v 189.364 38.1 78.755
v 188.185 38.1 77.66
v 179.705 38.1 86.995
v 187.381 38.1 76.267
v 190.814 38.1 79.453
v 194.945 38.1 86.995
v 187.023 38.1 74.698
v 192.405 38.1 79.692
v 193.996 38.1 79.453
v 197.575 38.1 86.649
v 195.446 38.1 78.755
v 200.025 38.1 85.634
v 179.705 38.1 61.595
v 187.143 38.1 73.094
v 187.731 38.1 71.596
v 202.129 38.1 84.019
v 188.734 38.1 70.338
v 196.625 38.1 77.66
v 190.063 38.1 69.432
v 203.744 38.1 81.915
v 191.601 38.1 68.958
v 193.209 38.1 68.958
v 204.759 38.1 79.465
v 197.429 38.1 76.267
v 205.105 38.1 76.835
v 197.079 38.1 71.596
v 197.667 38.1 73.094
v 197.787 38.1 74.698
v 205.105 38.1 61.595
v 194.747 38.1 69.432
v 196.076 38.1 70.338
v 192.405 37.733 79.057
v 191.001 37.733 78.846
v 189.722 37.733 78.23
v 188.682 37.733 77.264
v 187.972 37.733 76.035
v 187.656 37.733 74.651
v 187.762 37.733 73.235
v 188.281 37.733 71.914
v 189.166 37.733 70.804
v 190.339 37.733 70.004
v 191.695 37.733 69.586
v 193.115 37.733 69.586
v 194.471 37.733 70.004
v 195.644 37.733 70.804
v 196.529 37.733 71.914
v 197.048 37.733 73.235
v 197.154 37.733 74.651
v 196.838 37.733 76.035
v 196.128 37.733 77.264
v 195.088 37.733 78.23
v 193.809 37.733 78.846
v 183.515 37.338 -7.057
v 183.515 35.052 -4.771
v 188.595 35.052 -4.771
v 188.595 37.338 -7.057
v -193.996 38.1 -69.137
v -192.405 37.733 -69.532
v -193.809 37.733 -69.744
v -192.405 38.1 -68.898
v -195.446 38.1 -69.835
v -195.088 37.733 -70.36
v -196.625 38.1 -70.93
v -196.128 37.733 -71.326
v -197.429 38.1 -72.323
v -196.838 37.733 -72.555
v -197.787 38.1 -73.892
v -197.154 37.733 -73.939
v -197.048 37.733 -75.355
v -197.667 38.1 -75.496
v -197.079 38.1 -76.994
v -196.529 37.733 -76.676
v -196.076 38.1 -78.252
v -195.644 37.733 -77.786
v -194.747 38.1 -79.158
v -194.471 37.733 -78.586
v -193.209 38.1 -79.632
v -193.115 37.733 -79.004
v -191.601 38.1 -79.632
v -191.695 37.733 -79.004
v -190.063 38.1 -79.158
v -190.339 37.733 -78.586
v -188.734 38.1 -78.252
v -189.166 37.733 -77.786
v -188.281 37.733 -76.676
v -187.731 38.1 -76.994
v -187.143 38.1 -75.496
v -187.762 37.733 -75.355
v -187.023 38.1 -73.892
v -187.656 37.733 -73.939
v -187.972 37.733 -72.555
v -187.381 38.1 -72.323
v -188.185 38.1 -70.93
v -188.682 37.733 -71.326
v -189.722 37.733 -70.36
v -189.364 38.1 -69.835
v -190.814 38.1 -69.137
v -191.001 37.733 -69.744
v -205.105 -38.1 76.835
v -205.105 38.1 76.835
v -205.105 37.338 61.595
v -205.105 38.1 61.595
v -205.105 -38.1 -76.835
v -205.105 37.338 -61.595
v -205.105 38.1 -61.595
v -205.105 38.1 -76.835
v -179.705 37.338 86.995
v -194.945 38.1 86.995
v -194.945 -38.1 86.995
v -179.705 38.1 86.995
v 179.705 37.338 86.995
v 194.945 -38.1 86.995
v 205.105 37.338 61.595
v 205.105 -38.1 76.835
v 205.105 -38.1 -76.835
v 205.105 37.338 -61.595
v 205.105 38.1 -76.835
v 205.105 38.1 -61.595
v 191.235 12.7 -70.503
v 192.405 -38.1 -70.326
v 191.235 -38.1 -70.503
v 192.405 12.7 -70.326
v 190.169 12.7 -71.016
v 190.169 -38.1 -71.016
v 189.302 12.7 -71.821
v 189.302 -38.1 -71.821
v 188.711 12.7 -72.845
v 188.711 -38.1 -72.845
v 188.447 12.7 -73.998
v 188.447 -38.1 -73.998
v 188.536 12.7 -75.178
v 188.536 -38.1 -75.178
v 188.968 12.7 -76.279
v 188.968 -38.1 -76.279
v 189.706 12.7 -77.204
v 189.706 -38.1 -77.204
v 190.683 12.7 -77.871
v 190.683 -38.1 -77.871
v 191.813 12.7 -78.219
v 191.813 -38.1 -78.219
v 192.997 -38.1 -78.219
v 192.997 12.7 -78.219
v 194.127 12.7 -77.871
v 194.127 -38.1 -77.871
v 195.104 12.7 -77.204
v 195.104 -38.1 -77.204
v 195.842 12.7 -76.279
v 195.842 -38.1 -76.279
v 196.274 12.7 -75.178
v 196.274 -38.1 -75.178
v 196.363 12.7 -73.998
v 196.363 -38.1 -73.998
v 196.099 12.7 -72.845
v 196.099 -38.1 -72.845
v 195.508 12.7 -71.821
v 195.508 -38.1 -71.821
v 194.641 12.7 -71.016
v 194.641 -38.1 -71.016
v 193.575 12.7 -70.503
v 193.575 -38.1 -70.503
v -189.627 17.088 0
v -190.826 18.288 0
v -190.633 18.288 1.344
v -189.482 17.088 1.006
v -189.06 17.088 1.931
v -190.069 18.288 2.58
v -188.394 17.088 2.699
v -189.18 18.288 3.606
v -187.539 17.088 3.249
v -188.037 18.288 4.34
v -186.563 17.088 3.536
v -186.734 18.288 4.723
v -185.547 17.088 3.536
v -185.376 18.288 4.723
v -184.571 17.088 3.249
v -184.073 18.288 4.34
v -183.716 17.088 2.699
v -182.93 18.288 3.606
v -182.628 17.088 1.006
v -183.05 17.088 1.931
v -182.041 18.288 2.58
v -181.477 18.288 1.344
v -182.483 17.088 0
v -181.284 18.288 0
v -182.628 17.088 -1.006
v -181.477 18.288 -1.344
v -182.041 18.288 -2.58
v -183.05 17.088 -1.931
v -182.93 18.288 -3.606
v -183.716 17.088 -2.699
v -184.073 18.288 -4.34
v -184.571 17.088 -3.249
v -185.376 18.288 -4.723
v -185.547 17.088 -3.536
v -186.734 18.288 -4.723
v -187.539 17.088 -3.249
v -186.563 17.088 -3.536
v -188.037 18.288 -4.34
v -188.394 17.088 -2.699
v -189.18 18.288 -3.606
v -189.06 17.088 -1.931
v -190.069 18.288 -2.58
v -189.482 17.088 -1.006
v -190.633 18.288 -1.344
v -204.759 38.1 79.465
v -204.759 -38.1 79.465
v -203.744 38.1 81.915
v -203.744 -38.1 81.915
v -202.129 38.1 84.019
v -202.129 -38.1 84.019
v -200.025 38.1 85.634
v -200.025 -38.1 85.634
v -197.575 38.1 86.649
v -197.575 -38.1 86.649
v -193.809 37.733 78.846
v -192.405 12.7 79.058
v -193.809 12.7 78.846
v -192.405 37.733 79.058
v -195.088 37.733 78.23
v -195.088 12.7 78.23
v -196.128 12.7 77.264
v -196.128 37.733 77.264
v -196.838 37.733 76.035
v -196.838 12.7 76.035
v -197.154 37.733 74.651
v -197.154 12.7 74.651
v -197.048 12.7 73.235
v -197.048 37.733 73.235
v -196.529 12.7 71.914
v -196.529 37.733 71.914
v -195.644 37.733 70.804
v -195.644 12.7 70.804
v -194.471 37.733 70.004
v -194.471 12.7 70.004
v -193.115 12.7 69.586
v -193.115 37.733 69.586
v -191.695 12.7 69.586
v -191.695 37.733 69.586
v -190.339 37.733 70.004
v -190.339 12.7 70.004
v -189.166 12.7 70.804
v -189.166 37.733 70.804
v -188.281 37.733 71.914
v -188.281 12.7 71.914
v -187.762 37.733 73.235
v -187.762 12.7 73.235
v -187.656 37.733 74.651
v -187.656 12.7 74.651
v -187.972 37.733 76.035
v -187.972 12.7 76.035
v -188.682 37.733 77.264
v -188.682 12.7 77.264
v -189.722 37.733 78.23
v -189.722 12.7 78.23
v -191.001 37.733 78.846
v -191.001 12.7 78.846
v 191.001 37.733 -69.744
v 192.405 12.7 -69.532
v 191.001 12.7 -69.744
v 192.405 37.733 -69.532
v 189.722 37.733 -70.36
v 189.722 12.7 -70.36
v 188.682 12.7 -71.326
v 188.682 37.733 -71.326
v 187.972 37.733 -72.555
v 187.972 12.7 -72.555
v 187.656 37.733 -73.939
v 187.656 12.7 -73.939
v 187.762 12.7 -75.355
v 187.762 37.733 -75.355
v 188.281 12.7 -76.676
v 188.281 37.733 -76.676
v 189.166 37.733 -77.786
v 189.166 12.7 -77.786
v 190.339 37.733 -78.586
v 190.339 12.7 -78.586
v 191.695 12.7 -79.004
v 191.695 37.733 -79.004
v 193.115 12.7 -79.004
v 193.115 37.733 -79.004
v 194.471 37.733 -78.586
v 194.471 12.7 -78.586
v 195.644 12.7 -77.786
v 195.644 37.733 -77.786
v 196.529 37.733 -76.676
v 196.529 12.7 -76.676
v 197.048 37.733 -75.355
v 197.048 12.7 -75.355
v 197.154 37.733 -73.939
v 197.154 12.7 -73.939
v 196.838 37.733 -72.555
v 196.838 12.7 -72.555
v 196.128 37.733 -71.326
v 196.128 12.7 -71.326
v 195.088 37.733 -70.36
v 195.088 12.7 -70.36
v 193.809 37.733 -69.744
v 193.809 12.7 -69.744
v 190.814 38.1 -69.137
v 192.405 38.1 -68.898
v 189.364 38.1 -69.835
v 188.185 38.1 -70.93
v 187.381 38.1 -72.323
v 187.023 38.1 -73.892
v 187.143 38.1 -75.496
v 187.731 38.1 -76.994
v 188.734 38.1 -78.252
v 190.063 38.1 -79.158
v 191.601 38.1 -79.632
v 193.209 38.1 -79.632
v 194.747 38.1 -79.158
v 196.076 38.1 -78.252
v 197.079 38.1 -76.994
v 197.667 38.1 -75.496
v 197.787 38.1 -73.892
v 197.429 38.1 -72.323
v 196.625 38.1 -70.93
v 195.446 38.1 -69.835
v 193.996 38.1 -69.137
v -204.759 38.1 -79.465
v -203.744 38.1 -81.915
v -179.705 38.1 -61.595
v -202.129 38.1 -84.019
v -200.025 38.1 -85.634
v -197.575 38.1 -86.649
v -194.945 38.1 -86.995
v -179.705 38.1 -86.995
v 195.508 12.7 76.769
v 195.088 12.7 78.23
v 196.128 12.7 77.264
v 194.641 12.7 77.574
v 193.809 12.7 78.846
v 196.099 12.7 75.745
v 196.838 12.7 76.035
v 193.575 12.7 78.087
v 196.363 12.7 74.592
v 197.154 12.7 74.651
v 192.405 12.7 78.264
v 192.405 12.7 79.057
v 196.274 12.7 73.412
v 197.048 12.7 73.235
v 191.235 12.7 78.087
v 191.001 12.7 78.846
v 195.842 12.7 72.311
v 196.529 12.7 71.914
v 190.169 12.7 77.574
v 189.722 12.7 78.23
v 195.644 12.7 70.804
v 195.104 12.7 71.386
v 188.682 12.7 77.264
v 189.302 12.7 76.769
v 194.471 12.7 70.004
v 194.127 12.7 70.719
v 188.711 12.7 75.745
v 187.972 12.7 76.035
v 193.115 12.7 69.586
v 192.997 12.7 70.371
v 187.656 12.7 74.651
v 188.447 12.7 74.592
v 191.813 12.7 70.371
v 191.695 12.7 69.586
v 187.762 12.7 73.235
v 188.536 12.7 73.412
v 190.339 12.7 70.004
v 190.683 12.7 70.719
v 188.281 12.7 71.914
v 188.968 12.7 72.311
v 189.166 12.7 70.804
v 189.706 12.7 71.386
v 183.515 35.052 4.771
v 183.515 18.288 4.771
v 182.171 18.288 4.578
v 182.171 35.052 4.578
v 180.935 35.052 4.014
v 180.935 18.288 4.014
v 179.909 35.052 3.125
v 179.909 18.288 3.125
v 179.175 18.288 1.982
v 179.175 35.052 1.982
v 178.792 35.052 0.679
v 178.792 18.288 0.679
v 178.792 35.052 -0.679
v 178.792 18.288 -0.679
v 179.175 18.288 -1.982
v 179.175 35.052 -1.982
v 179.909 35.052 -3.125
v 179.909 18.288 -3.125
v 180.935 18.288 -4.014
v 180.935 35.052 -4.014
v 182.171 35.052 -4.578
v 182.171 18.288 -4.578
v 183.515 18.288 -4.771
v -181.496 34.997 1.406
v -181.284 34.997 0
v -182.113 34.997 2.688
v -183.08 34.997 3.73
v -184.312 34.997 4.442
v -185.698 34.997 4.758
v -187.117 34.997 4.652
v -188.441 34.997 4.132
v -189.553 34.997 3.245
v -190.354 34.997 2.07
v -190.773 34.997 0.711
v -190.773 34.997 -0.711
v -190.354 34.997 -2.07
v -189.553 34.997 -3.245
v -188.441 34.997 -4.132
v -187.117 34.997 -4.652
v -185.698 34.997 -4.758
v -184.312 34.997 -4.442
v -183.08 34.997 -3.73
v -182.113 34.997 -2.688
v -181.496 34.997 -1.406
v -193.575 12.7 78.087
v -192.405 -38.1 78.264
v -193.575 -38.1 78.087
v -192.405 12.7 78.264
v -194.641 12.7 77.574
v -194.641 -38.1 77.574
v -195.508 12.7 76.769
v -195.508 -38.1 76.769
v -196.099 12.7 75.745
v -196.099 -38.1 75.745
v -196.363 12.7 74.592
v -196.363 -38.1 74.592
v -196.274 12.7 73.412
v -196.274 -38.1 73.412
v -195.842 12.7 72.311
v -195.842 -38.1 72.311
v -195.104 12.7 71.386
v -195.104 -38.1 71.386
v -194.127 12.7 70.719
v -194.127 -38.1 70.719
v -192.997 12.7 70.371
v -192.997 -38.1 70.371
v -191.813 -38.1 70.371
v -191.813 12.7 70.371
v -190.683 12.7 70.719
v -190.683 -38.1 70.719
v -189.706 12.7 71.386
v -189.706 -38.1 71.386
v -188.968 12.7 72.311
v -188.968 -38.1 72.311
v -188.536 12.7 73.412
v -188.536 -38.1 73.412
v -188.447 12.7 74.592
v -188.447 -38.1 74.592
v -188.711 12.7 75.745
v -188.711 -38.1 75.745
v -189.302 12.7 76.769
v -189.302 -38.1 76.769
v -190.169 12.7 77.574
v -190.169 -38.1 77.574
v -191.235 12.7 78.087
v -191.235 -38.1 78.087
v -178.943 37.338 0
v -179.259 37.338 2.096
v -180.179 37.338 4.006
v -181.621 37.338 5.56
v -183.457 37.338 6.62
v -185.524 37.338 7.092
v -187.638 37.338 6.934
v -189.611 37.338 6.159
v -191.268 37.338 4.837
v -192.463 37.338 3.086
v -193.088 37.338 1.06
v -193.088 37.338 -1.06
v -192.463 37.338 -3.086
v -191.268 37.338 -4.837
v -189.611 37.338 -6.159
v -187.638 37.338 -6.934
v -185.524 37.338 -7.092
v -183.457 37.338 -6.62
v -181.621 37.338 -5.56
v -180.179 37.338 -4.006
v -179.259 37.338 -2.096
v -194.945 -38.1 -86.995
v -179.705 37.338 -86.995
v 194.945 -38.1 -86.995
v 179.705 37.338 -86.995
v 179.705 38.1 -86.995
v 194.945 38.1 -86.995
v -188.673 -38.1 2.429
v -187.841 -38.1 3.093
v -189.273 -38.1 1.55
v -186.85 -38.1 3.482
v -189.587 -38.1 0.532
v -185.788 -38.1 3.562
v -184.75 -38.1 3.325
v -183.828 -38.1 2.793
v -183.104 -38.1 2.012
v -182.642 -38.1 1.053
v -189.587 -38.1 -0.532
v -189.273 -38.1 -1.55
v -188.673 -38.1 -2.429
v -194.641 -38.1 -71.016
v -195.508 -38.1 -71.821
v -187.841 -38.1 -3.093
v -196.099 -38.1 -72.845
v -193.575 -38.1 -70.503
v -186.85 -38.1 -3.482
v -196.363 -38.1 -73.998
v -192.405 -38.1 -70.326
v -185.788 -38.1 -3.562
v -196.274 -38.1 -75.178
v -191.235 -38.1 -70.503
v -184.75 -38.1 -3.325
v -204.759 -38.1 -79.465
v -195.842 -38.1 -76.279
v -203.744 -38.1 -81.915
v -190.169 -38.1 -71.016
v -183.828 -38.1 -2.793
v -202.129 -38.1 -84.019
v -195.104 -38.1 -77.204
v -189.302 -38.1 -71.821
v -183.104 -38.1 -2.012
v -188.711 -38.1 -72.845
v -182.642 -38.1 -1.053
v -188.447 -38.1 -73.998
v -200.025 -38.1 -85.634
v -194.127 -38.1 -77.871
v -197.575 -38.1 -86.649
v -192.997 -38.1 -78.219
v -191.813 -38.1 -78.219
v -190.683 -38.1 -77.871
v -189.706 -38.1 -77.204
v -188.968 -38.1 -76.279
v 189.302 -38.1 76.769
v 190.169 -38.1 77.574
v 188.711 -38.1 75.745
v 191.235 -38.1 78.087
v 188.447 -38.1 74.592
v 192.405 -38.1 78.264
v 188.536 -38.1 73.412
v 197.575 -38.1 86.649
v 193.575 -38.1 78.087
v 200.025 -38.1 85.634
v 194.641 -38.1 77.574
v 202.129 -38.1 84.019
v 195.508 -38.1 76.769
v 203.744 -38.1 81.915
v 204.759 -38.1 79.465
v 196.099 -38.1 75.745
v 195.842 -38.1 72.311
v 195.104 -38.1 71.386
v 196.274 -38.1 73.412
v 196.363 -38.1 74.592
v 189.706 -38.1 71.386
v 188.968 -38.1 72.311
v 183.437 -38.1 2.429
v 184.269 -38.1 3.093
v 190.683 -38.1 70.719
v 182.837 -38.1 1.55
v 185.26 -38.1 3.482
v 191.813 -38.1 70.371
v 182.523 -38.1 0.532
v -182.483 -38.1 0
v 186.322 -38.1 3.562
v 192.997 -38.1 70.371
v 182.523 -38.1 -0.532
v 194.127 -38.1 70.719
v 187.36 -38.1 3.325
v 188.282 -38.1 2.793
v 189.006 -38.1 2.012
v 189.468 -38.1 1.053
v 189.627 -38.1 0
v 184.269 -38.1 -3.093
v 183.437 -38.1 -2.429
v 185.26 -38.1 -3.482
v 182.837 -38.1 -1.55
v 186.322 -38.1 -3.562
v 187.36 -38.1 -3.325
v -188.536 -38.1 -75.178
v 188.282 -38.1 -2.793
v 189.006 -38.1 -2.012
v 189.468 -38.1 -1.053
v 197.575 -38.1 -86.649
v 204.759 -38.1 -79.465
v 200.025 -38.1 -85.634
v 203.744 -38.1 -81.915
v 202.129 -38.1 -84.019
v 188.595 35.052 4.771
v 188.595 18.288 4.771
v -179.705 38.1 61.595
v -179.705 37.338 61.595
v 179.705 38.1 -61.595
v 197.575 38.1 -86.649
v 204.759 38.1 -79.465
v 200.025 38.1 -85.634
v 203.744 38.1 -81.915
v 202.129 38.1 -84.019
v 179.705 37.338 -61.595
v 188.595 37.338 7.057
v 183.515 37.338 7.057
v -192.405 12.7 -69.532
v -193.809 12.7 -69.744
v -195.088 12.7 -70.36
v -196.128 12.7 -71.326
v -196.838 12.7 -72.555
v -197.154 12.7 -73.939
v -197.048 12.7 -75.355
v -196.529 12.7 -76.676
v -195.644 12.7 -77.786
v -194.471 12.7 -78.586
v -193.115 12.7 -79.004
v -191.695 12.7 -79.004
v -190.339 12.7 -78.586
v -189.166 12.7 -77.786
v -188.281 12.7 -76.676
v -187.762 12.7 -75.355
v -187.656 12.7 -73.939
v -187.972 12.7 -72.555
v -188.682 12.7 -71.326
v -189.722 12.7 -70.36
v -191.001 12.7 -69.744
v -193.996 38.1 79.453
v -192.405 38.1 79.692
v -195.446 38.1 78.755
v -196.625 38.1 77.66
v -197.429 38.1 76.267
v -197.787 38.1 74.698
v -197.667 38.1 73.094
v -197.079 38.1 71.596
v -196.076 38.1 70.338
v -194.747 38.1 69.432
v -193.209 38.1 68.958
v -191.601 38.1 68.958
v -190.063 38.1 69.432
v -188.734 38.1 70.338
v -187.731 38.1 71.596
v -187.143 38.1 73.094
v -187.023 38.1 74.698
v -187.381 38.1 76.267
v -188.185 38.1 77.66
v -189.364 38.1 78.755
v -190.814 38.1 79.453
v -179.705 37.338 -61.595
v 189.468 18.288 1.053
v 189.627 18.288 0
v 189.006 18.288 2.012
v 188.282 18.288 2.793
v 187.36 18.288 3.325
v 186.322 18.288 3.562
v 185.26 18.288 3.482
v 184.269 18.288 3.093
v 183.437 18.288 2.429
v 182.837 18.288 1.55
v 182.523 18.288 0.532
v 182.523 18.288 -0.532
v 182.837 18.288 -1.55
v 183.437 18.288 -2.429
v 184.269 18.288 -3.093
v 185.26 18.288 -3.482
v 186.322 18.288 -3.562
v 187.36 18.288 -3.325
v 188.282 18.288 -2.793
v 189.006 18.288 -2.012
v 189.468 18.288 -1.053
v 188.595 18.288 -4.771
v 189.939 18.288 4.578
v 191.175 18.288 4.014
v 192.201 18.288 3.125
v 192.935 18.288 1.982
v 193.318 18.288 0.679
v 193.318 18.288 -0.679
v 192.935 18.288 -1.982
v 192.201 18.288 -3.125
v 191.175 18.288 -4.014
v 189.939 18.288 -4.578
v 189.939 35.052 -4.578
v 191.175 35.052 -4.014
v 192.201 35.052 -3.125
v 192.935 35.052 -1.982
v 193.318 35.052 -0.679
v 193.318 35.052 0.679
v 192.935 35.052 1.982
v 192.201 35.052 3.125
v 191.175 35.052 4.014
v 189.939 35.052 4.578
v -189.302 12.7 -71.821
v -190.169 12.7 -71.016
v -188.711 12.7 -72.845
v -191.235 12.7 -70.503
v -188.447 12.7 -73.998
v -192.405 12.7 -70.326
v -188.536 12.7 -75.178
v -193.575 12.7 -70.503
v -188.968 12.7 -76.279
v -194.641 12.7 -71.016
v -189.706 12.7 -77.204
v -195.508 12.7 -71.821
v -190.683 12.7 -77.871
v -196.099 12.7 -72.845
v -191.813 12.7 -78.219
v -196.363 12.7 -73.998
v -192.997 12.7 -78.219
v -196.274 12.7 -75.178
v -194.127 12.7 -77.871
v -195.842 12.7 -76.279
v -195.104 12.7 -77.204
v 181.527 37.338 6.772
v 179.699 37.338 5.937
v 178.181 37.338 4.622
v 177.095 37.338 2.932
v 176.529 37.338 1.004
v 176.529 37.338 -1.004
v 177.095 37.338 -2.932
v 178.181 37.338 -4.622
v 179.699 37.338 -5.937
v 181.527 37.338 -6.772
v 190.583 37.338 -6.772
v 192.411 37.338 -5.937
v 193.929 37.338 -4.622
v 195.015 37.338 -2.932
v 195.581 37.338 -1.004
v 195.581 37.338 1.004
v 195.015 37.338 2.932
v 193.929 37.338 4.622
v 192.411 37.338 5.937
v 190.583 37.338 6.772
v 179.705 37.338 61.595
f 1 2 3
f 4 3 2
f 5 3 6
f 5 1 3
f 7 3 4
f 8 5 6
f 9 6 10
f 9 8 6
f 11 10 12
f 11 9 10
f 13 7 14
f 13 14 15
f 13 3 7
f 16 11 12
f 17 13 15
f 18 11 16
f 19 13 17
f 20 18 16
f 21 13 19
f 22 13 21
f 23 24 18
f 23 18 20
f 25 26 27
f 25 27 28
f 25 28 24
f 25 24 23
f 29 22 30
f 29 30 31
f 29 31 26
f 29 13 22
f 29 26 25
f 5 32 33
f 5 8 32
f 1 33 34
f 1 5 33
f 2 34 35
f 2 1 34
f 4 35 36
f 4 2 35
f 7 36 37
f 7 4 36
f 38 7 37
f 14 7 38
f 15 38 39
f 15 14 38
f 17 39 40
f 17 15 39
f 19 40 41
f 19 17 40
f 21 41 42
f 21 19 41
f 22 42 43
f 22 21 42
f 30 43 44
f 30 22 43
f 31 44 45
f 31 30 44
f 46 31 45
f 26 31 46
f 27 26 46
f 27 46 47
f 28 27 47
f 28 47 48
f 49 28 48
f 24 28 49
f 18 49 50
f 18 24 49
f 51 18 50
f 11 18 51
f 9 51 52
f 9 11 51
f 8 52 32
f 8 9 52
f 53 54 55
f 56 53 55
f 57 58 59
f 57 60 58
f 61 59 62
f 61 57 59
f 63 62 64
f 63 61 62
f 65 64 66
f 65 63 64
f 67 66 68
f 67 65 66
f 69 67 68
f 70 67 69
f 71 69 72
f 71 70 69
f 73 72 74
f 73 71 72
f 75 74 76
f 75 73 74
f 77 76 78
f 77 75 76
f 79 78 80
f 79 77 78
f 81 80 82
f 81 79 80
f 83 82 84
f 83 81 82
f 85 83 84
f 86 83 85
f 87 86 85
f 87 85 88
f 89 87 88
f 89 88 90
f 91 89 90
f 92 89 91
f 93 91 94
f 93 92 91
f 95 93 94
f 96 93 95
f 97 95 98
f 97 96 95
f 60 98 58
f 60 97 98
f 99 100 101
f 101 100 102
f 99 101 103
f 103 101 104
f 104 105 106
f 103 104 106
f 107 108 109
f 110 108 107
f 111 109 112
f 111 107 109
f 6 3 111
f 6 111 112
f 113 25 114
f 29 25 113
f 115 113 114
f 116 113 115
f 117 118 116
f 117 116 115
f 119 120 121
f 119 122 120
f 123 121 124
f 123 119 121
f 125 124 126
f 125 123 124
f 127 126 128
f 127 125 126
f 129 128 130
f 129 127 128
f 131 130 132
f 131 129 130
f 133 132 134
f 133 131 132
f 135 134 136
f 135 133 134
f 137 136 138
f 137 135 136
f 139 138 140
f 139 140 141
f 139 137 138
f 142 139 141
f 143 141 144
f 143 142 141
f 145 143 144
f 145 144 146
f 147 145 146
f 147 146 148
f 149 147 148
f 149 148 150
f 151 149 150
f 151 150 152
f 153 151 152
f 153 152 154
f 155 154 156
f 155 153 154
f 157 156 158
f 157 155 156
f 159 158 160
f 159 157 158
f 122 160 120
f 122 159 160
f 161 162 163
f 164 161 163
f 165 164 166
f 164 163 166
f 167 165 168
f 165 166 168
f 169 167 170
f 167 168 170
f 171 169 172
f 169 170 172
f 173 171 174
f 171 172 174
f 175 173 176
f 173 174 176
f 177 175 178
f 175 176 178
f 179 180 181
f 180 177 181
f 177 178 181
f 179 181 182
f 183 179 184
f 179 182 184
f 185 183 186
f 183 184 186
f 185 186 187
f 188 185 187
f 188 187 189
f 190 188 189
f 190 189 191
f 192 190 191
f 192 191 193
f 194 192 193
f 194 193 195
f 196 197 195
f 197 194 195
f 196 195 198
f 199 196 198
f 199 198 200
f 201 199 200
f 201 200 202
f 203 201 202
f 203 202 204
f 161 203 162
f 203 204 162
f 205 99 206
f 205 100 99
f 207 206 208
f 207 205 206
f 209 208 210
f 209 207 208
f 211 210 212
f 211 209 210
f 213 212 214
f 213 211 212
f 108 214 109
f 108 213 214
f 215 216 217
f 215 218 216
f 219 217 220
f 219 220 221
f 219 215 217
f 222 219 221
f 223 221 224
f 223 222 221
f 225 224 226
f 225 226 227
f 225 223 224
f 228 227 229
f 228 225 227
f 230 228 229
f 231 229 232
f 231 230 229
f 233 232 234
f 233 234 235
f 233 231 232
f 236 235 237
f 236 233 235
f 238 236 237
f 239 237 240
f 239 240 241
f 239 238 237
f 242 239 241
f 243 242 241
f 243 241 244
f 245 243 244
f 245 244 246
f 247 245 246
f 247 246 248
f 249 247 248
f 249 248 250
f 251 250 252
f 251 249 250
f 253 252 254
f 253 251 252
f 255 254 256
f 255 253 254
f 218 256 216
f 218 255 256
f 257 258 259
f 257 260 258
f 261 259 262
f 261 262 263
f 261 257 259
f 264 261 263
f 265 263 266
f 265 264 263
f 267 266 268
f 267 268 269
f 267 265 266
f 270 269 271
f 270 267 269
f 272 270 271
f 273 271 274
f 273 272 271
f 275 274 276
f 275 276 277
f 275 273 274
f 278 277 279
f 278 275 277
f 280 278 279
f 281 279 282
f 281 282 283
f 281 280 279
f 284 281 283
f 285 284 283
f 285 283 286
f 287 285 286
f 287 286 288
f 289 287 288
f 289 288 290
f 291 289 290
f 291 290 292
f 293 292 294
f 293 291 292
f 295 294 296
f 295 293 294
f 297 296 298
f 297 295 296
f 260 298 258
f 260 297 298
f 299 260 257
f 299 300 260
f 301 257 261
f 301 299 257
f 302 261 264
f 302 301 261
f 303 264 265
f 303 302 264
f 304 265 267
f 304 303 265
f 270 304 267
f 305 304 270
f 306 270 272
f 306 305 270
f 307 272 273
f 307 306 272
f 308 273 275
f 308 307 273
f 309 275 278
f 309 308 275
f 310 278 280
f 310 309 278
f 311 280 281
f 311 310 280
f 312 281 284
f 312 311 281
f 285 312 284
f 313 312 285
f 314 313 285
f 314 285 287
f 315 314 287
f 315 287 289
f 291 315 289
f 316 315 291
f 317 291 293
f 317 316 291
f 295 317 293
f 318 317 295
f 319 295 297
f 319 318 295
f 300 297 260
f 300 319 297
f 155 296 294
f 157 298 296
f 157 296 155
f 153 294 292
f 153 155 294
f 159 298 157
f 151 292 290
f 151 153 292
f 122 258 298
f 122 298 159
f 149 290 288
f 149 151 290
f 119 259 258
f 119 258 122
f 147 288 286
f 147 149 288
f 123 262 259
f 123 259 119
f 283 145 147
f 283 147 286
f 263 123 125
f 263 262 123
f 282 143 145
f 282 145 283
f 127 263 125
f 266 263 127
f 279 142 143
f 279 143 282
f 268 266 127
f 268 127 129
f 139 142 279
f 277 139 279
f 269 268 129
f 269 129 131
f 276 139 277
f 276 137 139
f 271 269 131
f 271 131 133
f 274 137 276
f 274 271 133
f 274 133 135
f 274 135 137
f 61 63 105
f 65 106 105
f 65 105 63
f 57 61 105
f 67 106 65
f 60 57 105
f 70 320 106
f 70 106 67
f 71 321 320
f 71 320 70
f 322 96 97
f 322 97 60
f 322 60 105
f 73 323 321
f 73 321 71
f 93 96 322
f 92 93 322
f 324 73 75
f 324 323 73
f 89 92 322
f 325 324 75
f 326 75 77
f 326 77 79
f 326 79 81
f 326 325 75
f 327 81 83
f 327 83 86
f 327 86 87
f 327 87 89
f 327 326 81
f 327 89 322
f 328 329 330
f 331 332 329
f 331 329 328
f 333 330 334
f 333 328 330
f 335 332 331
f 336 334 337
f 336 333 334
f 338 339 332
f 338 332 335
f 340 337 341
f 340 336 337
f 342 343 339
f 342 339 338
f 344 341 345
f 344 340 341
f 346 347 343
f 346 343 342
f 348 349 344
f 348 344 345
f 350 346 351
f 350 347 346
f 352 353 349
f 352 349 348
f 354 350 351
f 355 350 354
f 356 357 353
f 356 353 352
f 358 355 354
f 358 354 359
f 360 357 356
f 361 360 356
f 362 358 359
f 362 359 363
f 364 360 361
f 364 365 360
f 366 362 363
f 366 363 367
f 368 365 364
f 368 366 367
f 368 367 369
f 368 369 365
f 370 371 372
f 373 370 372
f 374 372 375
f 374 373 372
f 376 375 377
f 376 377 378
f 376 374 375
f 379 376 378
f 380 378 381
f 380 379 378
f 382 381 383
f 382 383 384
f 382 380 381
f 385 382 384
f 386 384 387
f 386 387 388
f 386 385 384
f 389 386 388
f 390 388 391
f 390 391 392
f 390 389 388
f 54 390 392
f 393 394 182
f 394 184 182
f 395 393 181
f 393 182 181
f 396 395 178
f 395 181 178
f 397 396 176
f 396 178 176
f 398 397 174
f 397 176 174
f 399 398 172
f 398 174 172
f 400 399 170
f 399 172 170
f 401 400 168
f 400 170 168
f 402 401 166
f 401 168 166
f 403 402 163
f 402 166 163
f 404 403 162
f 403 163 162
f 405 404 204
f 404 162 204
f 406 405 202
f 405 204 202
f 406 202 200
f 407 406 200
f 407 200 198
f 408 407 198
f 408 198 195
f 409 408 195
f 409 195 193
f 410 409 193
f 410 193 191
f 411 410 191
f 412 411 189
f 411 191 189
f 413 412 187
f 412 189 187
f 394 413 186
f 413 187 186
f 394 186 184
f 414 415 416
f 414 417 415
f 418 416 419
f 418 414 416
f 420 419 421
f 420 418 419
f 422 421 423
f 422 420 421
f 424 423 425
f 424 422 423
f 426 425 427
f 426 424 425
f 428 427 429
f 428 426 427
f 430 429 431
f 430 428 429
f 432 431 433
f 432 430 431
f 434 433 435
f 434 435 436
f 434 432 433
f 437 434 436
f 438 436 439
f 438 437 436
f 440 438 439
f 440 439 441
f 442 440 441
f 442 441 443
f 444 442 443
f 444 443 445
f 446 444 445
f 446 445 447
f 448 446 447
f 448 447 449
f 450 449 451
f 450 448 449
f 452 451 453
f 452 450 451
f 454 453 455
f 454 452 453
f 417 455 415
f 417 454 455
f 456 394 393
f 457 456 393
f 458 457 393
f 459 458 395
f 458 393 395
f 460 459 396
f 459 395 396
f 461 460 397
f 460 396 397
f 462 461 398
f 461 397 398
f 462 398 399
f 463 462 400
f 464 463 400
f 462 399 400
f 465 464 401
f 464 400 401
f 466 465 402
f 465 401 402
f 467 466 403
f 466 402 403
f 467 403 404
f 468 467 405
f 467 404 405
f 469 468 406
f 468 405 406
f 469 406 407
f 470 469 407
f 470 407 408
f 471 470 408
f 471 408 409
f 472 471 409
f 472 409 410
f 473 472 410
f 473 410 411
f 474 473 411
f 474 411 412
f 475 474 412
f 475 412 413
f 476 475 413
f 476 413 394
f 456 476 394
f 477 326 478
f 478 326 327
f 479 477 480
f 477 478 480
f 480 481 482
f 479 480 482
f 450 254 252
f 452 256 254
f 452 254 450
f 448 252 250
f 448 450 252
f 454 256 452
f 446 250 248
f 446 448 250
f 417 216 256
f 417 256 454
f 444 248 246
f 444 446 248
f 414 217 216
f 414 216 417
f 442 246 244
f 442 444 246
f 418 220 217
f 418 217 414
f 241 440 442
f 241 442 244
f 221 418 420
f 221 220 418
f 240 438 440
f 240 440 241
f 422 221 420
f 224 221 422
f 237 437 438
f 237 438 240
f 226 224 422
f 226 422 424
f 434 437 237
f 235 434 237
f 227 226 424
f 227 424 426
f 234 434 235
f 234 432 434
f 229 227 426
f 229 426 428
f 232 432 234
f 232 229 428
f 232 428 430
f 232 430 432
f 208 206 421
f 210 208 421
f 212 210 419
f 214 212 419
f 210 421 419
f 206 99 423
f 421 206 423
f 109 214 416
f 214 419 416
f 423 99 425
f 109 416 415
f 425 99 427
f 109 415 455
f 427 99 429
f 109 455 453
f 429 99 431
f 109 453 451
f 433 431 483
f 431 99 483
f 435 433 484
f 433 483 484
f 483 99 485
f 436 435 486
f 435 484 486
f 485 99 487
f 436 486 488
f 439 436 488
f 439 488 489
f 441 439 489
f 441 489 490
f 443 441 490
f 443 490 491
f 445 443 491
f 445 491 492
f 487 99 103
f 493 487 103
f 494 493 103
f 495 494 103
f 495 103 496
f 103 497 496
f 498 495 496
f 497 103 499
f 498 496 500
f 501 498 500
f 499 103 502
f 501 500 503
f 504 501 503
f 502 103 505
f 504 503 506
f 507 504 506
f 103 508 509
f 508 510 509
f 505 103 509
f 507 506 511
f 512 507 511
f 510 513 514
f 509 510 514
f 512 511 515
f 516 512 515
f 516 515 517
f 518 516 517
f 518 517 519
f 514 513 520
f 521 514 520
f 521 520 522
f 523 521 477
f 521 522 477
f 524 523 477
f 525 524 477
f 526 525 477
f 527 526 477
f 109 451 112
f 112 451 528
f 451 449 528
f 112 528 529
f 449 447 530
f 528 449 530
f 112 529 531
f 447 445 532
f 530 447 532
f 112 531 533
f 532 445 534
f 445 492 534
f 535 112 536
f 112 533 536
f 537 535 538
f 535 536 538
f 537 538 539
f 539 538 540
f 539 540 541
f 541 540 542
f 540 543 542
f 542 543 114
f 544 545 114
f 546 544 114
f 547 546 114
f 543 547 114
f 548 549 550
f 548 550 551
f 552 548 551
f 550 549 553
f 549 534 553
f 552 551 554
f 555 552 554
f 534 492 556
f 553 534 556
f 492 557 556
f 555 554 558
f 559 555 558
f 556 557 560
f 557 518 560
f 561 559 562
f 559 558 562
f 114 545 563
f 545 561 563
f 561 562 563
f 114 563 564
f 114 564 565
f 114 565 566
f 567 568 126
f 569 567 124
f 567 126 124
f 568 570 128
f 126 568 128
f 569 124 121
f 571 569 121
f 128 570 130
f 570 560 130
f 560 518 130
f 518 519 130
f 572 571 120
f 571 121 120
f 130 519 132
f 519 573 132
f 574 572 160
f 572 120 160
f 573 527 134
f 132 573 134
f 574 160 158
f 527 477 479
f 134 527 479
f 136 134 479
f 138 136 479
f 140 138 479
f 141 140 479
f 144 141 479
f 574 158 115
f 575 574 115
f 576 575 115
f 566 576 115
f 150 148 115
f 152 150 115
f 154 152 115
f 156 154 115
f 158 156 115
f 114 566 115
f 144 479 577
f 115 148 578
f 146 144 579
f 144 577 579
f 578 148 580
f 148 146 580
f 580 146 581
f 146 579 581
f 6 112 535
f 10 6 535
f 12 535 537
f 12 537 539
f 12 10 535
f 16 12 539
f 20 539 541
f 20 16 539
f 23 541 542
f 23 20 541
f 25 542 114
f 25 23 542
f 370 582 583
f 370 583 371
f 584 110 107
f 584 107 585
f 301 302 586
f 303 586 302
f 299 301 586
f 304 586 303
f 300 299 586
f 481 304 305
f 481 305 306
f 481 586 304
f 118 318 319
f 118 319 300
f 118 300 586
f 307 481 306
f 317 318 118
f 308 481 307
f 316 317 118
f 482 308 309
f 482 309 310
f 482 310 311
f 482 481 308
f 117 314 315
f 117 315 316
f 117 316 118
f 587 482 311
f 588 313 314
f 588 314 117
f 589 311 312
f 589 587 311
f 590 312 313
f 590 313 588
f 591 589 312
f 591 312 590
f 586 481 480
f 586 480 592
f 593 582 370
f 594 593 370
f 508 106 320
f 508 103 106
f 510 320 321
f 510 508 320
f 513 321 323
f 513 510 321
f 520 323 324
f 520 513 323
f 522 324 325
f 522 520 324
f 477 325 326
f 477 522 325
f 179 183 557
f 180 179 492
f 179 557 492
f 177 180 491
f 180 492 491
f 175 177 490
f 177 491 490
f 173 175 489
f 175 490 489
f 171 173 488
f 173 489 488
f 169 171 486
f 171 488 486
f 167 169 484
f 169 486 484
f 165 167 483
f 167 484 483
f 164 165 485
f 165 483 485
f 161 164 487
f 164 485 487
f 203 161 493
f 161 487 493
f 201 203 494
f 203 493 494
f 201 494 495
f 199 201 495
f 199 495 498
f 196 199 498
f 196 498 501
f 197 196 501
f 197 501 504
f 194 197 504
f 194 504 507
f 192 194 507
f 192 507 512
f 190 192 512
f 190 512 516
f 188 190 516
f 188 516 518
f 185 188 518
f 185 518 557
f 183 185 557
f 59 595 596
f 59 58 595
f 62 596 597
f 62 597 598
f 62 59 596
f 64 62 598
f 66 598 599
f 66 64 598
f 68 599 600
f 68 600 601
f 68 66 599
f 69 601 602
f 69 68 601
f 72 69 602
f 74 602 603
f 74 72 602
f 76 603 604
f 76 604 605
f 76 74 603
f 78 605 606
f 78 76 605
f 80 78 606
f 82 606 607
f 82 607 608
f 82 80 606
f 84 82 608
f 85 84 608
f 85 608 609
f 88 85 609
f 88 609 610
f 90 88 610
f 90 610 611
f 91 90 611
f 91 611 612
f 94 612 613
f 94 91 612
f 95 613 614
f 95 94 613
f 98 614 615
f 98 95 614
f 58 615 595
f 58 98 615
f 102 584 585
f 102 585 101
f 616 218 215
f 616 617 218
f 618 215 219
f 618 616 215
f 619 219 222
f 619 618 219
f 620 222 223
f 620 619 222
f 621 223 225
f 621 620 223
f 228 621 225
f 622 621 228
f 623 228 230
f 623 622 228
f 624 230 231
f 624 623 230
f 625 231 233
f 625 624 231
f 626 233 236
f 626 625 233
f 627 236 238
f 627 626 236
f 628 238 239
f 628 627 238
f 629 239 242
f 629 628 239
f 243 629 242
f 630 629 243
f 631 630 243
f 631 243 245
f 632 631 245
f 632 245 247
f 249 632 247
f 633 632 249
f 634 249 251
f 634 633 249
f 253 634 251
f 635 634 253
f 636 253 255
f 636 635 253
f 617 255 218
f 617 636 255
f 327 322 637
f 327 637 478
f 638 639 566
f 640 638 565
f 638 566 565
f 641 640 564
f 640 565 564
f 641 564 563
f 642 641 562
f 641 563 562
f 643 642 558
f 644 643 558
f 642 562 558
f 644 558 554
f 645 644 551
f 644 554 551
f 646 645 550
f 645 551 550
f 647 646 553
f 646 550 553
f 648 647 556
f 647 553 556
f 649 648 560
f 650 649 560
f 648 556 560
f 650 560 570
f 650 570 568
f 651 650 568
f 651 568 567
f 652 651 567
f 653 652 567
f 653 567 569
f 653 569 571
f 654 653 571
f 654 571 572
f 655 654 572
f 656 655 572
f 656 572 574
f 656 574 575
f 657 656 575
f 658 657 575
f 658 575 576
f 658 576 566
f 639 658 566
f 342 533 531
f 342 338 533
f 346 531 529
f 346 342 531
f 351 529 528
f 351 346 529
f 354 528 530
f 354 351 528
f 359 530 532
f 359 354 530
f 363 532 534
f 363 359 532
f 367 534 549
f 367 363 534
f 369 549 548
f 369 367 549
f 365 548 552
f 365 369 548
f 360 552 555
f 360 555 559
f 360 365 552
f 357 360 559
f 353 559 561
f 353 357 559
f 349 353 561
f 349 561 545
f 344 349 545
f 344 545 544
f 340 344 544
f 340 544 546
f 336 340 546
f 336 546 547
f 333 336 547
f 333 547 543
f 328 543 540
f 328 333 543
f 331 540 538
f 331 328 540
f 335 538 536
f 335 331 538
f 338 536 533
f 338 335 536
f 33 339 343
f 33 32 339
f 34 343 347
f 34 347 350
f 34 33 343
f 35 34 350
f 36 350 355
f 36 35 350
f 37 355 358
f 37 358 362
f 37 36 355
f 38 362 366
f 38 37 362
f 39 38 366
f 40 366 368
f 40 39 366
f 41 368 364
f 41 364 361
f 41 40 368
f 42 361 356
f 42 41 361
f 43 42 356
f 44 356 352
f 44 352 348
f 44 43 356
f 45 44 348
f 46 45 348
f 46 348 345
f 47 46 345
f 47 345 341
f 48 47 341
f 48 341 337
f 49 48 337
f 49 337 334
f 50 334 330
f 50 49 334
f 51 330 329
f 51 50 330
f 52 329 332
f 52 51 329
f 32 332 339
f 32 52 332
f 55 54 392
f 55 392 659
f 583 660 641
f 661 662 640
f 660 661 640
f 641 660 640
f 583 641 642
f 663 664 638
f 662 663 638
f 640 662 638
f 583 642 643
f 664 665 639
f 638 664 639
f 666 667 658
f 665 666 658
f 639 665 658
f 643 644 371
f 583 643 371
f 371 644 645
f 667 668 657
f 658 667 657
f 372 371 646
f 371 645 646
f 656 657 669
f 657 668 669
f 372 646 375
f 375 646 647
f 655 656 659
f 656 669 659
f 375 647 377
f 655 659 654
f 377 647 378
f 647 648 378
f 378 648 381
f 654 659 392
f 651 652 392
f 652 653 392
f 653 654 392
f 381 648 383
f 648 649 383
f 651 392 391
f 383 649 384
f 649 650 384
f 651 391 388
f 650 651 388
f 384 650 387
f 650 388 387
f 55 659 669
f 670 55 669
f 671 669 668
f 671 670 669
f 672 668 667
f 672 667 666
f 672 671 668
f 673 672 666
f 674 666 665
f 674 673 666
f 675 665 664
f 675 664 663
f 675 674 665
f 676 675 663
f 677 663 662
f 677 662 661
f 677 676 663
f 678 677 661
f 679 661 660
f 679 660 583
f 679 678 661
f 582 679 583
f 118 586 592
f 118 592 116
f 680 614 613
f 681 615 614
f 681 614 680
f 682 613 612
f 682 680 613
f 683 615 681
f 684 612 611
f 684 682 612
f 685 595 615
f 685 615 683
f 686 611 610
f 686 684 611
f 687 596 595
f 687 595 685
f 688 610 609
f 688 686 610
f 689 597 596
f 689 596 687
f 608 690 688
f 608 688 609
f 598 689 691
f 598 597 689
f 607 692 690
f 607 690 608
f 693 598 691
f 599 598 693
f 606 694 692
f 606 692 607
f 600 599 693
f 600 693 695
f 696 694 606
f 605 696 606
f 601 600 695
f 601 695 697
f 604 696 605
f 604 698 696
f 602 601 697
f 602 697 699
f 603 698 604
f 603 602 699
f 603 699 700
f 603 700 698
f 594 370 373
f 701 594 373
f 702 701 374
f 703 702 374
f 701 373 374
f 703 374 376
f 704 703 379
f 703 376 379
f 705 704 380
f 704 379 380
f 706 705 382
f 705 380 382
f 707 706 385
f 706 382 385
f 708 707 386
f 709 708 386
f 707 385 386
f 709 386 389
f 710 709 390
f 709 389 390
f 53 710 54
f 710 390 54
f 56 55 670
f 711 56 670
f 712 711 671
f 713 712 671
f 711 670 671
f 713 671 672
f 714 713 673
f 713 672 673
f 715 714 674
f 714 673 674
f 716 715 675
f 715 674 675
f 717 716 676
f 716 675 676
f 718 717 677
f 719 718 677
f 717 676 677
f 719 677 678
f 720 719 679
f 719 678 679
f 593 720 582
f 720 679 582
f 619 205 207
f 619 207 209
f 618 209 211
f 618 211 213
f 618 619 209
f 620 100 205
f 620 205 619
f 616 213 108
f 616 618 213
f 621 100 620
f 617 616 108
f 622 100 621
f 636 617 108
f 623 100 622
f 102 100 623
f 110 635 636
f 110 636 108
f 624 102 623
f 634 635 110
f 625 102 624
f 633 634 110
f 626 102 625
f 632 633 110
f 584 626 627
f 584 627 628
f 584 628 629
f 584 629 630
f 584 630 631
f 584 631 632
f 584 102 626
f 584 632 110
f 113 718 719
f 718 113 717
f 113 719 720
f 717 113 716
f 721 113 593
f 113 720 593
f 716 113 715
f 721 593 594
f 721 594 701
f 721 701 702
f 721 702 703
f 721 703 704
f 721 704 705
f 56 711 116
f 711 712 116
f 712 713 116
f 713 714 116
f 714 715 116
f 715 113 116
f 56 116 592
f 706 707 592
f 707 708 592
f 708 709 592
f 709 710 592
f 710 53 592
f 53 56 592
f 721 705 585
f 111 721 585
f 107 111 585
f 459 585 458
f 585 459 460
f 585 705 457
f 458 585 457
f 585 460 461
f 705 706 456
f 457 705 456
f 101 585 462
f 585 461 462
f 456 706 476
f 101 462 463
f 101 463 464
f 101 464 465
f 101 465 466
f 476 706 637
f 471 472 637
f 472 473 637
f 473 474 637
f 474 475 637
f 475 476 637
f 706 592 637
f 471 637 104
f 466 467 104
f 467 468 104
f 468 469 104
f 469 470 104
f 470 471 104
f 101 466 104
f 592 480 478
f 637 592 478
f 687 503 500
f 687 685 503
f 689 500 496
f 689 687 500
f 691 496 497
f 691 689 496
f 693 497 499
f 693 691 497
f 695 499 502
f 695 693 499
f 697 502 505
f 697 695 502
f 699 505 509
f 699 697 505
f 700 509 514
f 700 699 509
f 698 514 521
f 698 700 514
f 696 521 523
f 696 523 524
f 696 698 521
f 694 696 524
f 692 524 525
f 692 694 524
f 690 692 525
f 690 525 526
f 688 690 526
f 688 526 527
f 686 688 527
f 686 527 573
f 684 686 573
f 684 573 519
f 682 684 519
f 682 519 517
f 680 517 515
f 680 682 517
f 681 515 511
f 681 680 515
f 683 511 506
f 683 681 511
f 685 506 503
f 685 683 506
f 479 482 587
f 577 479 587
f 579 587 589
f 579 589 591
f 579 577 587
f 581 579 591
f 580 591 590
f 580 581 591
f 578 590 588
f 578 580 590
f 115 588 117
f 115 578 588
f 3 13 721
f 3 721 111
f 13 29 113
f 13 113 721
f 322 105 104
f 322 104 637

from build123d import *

# Parameters (mm, degrees)
SKETCH1_W                                  = 410.21
SKETCH1_H                                  = 173.99
EXTRUDE1_DEPTH                             = 38.1
EXTRUDE2_DEPTH                             = 0.762
F_3_8_16_TAPPED_HOLE2_AT_2_COUNT           = 2
F_3_8_16_TAPPED_HOLE2_AT_2_PITCH           = 148.59
F_3_8_16_TAPPED_HOLE2_AT_3_COUNT           = 2
F_3_8_16_TAPPED_HOLE2_AT_3_PITCH           = 412.501786905
F_3_8_16_TAPPED_HOLE2_AT_4_COUNT           = 2
F_3_8_16_TAPPED_HOLE2_AT_4_PITCH           = 384.81
FILLET1_R                                  = 10.16
F_3_8_DOWEL_PIN_HOLE_D                     = 9.54278
F_3_8_DOWEL_PIN_HOLE_DEPTH                 = 19.05
F_3_8_DOWEL_PIN_HOLE_CSINK_D               = 14.224
F_3_8_DOWEL_PIN_HOLE_CSINK_ANGLE           = 90
F_3_8_DOWEL_PIN_HOLE_TIP                   = 4.77139
EXTRUDE3_DEPTH                             = 19.05
CHAMFER1_SIZE                              = 2.286
F_7_32_0_21875_DIAMETER_HOLE_VENTED_HOLE_D = 7.14375


with BuildPart() as part:
    # Sketch1 → Extrude1 (new body, symmetric)
    with BuildSketch(Plane(origin=(0, 0, 0), x_dir=(1, 0, 0), z_dir=(0, 1, 0))):
        Rectangle(SKETCH1_W, SKETCH1_H)
    extrude(amount=EXTRUDE1_DEPTH, both=True)

    # Sketch2 → Extrude2 (cut)
    with BuildSketch(Plane(origin=(0, 38.1, 0), x_dir=(1, 0, 0), z_dir=(0, 1, 0))):
        Polygon((-205.105, 61.595), (-179.705, 61.595), (-179.705, 86.995), (179.705, 86.995), (179.705, 61.595), (205.105, 61.595), (205.105, -61.595), (179.705, -61.595), (179.705, -86.995), (-179.705, -86.995), (-179.705, -61.595), (-205.105, -61.595), align=None)
    extrude(amount=-EXTRUDE2_DEPTH, mode=Mode.SUBTRACT)

    # Sketch3 → 3/8-16 Tapped Hole2 (revolve, cut)
    with BuildSketch(Plane(origin=(-192.405, 38.1, -74.295), x_dir=(0, 0, 1), z_dir=(1, 0, 0))):
        Polygon((0, 0), (0, 76.2), (3.96875, 76.2), (3.96875, 25.4), (4.7625, 25.4), (4.7625, 0.366617421), (5.3975, 0), align=None)
    f_3_8_16_tapped_hole2 = revolve(axis=Axis((-192.405, 44.45, -74.295), (0, -1, 0)), mode=Mode.SUBTRACT)

    # 3/8-16 Tapped Hole2 at 2: 3/8-16 Tapped Hole2 ×2
    with Locations(*[(0, 0, i * F_3_8_16_TAPPED_HOLE2_AT_2_PITCH) for i in range(1, F_3_8_16_TAPPED_HOLE2_AT_2_COUNT)]):
        add(f_3_8_16_tapped_hole2, mode=Mode.SUBTRACT)

    # 3/8-16 Tapped Hole2 at 3: 3/8-16 Tapped Hole2 ×2
    with Locations(*[Vector(0.932868686, 0, 0.360216621) * (i * F_3_8_16_TAPPED_HOLE2_AT_3_PITCH) for i in range(1, F_3_8_16_TAPPED_HOLE2_AT_3_COUNT)]):
        add(f_3_8_16_tapped_hole2, mode=Mode.SUBTRACT)

    # 3/8-16 Tapped Hole2 at 4: 3/8-16 Tapped Hole2 ×2
    with Locations(*[(i * F_3_8_16_TAPPED_HOLE2_AT_4_PITCH, 0, 0) for i in range(1, F_3_8_16_TAPPED_HOLE2_AT_4_COUNT)]):
        add(f_3_8_16_tapped_hole2, mode=Mode.SUBTRACT)

    # Fillet1
    fillet1_edges = [part.edges().sort_by_distance(p)[0] for p in [
        (-205.105, 0, -86.995),
        (205.105, 0, -86.995),
        (205.105, 0, 86.995),
        (-205.105, 0, 86.995),
    ]]
    fillet(fillet1_edges, radius=FILLET1_R)

    # 3/8 dowel pin hole
    with Locations(Plane(origin=(0, 37.338, 0), x_dir=(-1, 0, 0), z_dir=(0, 1, 0))):
        with Locations((186.055, 0)):
            CounterSinkHole(F_3_8_DOWEL_PIN_HOLE_D / 2, F_3_8_DOWEL_PIN_HOLE_CSINK_D / 2, depth=F_3_8_DOWEL_PIN_HOLE_DEPTH, counter_sink_angle=F_3_8_DOWEL_PIN_HOLE_CSINK_ANGLE)
            with Locations((0, 0, -(F_3_8_DOWEL_PIN_HOLE_DEPTH + F_3_8_DOWEL_PIN_HOLE_TIP / 2))):  # 90° drill point
                Cone(0, F_3_8_DOWEL_PIN_HOLE_D / 2, F_3_8_DOWEL_PIN_HOLE_TIP, mode=Mode.SUBTRACT)

    # Sketch7 → Extrude3 (cut)
    with BuildSketch(Plane(origin=(0, 37.338, 0), x_dir=(1, 0, 0), z_dir=(0, 1, 0))):
        with BuildLine():
            Line((183.515, 4.77139), (188.595, 4.77139))
            ThreePointArc((188.595, 4.77139), (193.36639, 0), (188.595, -4.77139))
            Line((188.595, -4.77139), (183.515, -4.77139))
            ThreePointArc((183.515, -4.77139), (178.74361, 0), (183.515, 4.77139))
        make_face()
    extrude(amount=-EXTRUDE3_DEPTH, mode=Mode.SUBTRACT)

    # Chamfer1
    chamfer1_edges = [part.edges().sort_by_distance(p)[0] for p in [
        (178.74361, 37.338, 0),
        (186.055, 37.338, 4.77139),
        (193.36639, 37.338, 0),
        (186.055, 37.338, -4.77139),
    ]]
    chamfer(chamfer1_edges, length=CHAMFER1_SIZE)

    # 7/32 (0.21875) Diameter Hole Vented Holes (through all)
    with Locations(Plane(origin=(0, 37.338, 0), x_dir=(-1, 0, 0), z_dir=(0, 1, 0))):
        with Locations((-186.055, 0), (186.055, 0)):
            Hole(F_7_32_0_21875_DIAMETER_HOLE_VENTED_HOLE_D / 2)


solid = part.part
